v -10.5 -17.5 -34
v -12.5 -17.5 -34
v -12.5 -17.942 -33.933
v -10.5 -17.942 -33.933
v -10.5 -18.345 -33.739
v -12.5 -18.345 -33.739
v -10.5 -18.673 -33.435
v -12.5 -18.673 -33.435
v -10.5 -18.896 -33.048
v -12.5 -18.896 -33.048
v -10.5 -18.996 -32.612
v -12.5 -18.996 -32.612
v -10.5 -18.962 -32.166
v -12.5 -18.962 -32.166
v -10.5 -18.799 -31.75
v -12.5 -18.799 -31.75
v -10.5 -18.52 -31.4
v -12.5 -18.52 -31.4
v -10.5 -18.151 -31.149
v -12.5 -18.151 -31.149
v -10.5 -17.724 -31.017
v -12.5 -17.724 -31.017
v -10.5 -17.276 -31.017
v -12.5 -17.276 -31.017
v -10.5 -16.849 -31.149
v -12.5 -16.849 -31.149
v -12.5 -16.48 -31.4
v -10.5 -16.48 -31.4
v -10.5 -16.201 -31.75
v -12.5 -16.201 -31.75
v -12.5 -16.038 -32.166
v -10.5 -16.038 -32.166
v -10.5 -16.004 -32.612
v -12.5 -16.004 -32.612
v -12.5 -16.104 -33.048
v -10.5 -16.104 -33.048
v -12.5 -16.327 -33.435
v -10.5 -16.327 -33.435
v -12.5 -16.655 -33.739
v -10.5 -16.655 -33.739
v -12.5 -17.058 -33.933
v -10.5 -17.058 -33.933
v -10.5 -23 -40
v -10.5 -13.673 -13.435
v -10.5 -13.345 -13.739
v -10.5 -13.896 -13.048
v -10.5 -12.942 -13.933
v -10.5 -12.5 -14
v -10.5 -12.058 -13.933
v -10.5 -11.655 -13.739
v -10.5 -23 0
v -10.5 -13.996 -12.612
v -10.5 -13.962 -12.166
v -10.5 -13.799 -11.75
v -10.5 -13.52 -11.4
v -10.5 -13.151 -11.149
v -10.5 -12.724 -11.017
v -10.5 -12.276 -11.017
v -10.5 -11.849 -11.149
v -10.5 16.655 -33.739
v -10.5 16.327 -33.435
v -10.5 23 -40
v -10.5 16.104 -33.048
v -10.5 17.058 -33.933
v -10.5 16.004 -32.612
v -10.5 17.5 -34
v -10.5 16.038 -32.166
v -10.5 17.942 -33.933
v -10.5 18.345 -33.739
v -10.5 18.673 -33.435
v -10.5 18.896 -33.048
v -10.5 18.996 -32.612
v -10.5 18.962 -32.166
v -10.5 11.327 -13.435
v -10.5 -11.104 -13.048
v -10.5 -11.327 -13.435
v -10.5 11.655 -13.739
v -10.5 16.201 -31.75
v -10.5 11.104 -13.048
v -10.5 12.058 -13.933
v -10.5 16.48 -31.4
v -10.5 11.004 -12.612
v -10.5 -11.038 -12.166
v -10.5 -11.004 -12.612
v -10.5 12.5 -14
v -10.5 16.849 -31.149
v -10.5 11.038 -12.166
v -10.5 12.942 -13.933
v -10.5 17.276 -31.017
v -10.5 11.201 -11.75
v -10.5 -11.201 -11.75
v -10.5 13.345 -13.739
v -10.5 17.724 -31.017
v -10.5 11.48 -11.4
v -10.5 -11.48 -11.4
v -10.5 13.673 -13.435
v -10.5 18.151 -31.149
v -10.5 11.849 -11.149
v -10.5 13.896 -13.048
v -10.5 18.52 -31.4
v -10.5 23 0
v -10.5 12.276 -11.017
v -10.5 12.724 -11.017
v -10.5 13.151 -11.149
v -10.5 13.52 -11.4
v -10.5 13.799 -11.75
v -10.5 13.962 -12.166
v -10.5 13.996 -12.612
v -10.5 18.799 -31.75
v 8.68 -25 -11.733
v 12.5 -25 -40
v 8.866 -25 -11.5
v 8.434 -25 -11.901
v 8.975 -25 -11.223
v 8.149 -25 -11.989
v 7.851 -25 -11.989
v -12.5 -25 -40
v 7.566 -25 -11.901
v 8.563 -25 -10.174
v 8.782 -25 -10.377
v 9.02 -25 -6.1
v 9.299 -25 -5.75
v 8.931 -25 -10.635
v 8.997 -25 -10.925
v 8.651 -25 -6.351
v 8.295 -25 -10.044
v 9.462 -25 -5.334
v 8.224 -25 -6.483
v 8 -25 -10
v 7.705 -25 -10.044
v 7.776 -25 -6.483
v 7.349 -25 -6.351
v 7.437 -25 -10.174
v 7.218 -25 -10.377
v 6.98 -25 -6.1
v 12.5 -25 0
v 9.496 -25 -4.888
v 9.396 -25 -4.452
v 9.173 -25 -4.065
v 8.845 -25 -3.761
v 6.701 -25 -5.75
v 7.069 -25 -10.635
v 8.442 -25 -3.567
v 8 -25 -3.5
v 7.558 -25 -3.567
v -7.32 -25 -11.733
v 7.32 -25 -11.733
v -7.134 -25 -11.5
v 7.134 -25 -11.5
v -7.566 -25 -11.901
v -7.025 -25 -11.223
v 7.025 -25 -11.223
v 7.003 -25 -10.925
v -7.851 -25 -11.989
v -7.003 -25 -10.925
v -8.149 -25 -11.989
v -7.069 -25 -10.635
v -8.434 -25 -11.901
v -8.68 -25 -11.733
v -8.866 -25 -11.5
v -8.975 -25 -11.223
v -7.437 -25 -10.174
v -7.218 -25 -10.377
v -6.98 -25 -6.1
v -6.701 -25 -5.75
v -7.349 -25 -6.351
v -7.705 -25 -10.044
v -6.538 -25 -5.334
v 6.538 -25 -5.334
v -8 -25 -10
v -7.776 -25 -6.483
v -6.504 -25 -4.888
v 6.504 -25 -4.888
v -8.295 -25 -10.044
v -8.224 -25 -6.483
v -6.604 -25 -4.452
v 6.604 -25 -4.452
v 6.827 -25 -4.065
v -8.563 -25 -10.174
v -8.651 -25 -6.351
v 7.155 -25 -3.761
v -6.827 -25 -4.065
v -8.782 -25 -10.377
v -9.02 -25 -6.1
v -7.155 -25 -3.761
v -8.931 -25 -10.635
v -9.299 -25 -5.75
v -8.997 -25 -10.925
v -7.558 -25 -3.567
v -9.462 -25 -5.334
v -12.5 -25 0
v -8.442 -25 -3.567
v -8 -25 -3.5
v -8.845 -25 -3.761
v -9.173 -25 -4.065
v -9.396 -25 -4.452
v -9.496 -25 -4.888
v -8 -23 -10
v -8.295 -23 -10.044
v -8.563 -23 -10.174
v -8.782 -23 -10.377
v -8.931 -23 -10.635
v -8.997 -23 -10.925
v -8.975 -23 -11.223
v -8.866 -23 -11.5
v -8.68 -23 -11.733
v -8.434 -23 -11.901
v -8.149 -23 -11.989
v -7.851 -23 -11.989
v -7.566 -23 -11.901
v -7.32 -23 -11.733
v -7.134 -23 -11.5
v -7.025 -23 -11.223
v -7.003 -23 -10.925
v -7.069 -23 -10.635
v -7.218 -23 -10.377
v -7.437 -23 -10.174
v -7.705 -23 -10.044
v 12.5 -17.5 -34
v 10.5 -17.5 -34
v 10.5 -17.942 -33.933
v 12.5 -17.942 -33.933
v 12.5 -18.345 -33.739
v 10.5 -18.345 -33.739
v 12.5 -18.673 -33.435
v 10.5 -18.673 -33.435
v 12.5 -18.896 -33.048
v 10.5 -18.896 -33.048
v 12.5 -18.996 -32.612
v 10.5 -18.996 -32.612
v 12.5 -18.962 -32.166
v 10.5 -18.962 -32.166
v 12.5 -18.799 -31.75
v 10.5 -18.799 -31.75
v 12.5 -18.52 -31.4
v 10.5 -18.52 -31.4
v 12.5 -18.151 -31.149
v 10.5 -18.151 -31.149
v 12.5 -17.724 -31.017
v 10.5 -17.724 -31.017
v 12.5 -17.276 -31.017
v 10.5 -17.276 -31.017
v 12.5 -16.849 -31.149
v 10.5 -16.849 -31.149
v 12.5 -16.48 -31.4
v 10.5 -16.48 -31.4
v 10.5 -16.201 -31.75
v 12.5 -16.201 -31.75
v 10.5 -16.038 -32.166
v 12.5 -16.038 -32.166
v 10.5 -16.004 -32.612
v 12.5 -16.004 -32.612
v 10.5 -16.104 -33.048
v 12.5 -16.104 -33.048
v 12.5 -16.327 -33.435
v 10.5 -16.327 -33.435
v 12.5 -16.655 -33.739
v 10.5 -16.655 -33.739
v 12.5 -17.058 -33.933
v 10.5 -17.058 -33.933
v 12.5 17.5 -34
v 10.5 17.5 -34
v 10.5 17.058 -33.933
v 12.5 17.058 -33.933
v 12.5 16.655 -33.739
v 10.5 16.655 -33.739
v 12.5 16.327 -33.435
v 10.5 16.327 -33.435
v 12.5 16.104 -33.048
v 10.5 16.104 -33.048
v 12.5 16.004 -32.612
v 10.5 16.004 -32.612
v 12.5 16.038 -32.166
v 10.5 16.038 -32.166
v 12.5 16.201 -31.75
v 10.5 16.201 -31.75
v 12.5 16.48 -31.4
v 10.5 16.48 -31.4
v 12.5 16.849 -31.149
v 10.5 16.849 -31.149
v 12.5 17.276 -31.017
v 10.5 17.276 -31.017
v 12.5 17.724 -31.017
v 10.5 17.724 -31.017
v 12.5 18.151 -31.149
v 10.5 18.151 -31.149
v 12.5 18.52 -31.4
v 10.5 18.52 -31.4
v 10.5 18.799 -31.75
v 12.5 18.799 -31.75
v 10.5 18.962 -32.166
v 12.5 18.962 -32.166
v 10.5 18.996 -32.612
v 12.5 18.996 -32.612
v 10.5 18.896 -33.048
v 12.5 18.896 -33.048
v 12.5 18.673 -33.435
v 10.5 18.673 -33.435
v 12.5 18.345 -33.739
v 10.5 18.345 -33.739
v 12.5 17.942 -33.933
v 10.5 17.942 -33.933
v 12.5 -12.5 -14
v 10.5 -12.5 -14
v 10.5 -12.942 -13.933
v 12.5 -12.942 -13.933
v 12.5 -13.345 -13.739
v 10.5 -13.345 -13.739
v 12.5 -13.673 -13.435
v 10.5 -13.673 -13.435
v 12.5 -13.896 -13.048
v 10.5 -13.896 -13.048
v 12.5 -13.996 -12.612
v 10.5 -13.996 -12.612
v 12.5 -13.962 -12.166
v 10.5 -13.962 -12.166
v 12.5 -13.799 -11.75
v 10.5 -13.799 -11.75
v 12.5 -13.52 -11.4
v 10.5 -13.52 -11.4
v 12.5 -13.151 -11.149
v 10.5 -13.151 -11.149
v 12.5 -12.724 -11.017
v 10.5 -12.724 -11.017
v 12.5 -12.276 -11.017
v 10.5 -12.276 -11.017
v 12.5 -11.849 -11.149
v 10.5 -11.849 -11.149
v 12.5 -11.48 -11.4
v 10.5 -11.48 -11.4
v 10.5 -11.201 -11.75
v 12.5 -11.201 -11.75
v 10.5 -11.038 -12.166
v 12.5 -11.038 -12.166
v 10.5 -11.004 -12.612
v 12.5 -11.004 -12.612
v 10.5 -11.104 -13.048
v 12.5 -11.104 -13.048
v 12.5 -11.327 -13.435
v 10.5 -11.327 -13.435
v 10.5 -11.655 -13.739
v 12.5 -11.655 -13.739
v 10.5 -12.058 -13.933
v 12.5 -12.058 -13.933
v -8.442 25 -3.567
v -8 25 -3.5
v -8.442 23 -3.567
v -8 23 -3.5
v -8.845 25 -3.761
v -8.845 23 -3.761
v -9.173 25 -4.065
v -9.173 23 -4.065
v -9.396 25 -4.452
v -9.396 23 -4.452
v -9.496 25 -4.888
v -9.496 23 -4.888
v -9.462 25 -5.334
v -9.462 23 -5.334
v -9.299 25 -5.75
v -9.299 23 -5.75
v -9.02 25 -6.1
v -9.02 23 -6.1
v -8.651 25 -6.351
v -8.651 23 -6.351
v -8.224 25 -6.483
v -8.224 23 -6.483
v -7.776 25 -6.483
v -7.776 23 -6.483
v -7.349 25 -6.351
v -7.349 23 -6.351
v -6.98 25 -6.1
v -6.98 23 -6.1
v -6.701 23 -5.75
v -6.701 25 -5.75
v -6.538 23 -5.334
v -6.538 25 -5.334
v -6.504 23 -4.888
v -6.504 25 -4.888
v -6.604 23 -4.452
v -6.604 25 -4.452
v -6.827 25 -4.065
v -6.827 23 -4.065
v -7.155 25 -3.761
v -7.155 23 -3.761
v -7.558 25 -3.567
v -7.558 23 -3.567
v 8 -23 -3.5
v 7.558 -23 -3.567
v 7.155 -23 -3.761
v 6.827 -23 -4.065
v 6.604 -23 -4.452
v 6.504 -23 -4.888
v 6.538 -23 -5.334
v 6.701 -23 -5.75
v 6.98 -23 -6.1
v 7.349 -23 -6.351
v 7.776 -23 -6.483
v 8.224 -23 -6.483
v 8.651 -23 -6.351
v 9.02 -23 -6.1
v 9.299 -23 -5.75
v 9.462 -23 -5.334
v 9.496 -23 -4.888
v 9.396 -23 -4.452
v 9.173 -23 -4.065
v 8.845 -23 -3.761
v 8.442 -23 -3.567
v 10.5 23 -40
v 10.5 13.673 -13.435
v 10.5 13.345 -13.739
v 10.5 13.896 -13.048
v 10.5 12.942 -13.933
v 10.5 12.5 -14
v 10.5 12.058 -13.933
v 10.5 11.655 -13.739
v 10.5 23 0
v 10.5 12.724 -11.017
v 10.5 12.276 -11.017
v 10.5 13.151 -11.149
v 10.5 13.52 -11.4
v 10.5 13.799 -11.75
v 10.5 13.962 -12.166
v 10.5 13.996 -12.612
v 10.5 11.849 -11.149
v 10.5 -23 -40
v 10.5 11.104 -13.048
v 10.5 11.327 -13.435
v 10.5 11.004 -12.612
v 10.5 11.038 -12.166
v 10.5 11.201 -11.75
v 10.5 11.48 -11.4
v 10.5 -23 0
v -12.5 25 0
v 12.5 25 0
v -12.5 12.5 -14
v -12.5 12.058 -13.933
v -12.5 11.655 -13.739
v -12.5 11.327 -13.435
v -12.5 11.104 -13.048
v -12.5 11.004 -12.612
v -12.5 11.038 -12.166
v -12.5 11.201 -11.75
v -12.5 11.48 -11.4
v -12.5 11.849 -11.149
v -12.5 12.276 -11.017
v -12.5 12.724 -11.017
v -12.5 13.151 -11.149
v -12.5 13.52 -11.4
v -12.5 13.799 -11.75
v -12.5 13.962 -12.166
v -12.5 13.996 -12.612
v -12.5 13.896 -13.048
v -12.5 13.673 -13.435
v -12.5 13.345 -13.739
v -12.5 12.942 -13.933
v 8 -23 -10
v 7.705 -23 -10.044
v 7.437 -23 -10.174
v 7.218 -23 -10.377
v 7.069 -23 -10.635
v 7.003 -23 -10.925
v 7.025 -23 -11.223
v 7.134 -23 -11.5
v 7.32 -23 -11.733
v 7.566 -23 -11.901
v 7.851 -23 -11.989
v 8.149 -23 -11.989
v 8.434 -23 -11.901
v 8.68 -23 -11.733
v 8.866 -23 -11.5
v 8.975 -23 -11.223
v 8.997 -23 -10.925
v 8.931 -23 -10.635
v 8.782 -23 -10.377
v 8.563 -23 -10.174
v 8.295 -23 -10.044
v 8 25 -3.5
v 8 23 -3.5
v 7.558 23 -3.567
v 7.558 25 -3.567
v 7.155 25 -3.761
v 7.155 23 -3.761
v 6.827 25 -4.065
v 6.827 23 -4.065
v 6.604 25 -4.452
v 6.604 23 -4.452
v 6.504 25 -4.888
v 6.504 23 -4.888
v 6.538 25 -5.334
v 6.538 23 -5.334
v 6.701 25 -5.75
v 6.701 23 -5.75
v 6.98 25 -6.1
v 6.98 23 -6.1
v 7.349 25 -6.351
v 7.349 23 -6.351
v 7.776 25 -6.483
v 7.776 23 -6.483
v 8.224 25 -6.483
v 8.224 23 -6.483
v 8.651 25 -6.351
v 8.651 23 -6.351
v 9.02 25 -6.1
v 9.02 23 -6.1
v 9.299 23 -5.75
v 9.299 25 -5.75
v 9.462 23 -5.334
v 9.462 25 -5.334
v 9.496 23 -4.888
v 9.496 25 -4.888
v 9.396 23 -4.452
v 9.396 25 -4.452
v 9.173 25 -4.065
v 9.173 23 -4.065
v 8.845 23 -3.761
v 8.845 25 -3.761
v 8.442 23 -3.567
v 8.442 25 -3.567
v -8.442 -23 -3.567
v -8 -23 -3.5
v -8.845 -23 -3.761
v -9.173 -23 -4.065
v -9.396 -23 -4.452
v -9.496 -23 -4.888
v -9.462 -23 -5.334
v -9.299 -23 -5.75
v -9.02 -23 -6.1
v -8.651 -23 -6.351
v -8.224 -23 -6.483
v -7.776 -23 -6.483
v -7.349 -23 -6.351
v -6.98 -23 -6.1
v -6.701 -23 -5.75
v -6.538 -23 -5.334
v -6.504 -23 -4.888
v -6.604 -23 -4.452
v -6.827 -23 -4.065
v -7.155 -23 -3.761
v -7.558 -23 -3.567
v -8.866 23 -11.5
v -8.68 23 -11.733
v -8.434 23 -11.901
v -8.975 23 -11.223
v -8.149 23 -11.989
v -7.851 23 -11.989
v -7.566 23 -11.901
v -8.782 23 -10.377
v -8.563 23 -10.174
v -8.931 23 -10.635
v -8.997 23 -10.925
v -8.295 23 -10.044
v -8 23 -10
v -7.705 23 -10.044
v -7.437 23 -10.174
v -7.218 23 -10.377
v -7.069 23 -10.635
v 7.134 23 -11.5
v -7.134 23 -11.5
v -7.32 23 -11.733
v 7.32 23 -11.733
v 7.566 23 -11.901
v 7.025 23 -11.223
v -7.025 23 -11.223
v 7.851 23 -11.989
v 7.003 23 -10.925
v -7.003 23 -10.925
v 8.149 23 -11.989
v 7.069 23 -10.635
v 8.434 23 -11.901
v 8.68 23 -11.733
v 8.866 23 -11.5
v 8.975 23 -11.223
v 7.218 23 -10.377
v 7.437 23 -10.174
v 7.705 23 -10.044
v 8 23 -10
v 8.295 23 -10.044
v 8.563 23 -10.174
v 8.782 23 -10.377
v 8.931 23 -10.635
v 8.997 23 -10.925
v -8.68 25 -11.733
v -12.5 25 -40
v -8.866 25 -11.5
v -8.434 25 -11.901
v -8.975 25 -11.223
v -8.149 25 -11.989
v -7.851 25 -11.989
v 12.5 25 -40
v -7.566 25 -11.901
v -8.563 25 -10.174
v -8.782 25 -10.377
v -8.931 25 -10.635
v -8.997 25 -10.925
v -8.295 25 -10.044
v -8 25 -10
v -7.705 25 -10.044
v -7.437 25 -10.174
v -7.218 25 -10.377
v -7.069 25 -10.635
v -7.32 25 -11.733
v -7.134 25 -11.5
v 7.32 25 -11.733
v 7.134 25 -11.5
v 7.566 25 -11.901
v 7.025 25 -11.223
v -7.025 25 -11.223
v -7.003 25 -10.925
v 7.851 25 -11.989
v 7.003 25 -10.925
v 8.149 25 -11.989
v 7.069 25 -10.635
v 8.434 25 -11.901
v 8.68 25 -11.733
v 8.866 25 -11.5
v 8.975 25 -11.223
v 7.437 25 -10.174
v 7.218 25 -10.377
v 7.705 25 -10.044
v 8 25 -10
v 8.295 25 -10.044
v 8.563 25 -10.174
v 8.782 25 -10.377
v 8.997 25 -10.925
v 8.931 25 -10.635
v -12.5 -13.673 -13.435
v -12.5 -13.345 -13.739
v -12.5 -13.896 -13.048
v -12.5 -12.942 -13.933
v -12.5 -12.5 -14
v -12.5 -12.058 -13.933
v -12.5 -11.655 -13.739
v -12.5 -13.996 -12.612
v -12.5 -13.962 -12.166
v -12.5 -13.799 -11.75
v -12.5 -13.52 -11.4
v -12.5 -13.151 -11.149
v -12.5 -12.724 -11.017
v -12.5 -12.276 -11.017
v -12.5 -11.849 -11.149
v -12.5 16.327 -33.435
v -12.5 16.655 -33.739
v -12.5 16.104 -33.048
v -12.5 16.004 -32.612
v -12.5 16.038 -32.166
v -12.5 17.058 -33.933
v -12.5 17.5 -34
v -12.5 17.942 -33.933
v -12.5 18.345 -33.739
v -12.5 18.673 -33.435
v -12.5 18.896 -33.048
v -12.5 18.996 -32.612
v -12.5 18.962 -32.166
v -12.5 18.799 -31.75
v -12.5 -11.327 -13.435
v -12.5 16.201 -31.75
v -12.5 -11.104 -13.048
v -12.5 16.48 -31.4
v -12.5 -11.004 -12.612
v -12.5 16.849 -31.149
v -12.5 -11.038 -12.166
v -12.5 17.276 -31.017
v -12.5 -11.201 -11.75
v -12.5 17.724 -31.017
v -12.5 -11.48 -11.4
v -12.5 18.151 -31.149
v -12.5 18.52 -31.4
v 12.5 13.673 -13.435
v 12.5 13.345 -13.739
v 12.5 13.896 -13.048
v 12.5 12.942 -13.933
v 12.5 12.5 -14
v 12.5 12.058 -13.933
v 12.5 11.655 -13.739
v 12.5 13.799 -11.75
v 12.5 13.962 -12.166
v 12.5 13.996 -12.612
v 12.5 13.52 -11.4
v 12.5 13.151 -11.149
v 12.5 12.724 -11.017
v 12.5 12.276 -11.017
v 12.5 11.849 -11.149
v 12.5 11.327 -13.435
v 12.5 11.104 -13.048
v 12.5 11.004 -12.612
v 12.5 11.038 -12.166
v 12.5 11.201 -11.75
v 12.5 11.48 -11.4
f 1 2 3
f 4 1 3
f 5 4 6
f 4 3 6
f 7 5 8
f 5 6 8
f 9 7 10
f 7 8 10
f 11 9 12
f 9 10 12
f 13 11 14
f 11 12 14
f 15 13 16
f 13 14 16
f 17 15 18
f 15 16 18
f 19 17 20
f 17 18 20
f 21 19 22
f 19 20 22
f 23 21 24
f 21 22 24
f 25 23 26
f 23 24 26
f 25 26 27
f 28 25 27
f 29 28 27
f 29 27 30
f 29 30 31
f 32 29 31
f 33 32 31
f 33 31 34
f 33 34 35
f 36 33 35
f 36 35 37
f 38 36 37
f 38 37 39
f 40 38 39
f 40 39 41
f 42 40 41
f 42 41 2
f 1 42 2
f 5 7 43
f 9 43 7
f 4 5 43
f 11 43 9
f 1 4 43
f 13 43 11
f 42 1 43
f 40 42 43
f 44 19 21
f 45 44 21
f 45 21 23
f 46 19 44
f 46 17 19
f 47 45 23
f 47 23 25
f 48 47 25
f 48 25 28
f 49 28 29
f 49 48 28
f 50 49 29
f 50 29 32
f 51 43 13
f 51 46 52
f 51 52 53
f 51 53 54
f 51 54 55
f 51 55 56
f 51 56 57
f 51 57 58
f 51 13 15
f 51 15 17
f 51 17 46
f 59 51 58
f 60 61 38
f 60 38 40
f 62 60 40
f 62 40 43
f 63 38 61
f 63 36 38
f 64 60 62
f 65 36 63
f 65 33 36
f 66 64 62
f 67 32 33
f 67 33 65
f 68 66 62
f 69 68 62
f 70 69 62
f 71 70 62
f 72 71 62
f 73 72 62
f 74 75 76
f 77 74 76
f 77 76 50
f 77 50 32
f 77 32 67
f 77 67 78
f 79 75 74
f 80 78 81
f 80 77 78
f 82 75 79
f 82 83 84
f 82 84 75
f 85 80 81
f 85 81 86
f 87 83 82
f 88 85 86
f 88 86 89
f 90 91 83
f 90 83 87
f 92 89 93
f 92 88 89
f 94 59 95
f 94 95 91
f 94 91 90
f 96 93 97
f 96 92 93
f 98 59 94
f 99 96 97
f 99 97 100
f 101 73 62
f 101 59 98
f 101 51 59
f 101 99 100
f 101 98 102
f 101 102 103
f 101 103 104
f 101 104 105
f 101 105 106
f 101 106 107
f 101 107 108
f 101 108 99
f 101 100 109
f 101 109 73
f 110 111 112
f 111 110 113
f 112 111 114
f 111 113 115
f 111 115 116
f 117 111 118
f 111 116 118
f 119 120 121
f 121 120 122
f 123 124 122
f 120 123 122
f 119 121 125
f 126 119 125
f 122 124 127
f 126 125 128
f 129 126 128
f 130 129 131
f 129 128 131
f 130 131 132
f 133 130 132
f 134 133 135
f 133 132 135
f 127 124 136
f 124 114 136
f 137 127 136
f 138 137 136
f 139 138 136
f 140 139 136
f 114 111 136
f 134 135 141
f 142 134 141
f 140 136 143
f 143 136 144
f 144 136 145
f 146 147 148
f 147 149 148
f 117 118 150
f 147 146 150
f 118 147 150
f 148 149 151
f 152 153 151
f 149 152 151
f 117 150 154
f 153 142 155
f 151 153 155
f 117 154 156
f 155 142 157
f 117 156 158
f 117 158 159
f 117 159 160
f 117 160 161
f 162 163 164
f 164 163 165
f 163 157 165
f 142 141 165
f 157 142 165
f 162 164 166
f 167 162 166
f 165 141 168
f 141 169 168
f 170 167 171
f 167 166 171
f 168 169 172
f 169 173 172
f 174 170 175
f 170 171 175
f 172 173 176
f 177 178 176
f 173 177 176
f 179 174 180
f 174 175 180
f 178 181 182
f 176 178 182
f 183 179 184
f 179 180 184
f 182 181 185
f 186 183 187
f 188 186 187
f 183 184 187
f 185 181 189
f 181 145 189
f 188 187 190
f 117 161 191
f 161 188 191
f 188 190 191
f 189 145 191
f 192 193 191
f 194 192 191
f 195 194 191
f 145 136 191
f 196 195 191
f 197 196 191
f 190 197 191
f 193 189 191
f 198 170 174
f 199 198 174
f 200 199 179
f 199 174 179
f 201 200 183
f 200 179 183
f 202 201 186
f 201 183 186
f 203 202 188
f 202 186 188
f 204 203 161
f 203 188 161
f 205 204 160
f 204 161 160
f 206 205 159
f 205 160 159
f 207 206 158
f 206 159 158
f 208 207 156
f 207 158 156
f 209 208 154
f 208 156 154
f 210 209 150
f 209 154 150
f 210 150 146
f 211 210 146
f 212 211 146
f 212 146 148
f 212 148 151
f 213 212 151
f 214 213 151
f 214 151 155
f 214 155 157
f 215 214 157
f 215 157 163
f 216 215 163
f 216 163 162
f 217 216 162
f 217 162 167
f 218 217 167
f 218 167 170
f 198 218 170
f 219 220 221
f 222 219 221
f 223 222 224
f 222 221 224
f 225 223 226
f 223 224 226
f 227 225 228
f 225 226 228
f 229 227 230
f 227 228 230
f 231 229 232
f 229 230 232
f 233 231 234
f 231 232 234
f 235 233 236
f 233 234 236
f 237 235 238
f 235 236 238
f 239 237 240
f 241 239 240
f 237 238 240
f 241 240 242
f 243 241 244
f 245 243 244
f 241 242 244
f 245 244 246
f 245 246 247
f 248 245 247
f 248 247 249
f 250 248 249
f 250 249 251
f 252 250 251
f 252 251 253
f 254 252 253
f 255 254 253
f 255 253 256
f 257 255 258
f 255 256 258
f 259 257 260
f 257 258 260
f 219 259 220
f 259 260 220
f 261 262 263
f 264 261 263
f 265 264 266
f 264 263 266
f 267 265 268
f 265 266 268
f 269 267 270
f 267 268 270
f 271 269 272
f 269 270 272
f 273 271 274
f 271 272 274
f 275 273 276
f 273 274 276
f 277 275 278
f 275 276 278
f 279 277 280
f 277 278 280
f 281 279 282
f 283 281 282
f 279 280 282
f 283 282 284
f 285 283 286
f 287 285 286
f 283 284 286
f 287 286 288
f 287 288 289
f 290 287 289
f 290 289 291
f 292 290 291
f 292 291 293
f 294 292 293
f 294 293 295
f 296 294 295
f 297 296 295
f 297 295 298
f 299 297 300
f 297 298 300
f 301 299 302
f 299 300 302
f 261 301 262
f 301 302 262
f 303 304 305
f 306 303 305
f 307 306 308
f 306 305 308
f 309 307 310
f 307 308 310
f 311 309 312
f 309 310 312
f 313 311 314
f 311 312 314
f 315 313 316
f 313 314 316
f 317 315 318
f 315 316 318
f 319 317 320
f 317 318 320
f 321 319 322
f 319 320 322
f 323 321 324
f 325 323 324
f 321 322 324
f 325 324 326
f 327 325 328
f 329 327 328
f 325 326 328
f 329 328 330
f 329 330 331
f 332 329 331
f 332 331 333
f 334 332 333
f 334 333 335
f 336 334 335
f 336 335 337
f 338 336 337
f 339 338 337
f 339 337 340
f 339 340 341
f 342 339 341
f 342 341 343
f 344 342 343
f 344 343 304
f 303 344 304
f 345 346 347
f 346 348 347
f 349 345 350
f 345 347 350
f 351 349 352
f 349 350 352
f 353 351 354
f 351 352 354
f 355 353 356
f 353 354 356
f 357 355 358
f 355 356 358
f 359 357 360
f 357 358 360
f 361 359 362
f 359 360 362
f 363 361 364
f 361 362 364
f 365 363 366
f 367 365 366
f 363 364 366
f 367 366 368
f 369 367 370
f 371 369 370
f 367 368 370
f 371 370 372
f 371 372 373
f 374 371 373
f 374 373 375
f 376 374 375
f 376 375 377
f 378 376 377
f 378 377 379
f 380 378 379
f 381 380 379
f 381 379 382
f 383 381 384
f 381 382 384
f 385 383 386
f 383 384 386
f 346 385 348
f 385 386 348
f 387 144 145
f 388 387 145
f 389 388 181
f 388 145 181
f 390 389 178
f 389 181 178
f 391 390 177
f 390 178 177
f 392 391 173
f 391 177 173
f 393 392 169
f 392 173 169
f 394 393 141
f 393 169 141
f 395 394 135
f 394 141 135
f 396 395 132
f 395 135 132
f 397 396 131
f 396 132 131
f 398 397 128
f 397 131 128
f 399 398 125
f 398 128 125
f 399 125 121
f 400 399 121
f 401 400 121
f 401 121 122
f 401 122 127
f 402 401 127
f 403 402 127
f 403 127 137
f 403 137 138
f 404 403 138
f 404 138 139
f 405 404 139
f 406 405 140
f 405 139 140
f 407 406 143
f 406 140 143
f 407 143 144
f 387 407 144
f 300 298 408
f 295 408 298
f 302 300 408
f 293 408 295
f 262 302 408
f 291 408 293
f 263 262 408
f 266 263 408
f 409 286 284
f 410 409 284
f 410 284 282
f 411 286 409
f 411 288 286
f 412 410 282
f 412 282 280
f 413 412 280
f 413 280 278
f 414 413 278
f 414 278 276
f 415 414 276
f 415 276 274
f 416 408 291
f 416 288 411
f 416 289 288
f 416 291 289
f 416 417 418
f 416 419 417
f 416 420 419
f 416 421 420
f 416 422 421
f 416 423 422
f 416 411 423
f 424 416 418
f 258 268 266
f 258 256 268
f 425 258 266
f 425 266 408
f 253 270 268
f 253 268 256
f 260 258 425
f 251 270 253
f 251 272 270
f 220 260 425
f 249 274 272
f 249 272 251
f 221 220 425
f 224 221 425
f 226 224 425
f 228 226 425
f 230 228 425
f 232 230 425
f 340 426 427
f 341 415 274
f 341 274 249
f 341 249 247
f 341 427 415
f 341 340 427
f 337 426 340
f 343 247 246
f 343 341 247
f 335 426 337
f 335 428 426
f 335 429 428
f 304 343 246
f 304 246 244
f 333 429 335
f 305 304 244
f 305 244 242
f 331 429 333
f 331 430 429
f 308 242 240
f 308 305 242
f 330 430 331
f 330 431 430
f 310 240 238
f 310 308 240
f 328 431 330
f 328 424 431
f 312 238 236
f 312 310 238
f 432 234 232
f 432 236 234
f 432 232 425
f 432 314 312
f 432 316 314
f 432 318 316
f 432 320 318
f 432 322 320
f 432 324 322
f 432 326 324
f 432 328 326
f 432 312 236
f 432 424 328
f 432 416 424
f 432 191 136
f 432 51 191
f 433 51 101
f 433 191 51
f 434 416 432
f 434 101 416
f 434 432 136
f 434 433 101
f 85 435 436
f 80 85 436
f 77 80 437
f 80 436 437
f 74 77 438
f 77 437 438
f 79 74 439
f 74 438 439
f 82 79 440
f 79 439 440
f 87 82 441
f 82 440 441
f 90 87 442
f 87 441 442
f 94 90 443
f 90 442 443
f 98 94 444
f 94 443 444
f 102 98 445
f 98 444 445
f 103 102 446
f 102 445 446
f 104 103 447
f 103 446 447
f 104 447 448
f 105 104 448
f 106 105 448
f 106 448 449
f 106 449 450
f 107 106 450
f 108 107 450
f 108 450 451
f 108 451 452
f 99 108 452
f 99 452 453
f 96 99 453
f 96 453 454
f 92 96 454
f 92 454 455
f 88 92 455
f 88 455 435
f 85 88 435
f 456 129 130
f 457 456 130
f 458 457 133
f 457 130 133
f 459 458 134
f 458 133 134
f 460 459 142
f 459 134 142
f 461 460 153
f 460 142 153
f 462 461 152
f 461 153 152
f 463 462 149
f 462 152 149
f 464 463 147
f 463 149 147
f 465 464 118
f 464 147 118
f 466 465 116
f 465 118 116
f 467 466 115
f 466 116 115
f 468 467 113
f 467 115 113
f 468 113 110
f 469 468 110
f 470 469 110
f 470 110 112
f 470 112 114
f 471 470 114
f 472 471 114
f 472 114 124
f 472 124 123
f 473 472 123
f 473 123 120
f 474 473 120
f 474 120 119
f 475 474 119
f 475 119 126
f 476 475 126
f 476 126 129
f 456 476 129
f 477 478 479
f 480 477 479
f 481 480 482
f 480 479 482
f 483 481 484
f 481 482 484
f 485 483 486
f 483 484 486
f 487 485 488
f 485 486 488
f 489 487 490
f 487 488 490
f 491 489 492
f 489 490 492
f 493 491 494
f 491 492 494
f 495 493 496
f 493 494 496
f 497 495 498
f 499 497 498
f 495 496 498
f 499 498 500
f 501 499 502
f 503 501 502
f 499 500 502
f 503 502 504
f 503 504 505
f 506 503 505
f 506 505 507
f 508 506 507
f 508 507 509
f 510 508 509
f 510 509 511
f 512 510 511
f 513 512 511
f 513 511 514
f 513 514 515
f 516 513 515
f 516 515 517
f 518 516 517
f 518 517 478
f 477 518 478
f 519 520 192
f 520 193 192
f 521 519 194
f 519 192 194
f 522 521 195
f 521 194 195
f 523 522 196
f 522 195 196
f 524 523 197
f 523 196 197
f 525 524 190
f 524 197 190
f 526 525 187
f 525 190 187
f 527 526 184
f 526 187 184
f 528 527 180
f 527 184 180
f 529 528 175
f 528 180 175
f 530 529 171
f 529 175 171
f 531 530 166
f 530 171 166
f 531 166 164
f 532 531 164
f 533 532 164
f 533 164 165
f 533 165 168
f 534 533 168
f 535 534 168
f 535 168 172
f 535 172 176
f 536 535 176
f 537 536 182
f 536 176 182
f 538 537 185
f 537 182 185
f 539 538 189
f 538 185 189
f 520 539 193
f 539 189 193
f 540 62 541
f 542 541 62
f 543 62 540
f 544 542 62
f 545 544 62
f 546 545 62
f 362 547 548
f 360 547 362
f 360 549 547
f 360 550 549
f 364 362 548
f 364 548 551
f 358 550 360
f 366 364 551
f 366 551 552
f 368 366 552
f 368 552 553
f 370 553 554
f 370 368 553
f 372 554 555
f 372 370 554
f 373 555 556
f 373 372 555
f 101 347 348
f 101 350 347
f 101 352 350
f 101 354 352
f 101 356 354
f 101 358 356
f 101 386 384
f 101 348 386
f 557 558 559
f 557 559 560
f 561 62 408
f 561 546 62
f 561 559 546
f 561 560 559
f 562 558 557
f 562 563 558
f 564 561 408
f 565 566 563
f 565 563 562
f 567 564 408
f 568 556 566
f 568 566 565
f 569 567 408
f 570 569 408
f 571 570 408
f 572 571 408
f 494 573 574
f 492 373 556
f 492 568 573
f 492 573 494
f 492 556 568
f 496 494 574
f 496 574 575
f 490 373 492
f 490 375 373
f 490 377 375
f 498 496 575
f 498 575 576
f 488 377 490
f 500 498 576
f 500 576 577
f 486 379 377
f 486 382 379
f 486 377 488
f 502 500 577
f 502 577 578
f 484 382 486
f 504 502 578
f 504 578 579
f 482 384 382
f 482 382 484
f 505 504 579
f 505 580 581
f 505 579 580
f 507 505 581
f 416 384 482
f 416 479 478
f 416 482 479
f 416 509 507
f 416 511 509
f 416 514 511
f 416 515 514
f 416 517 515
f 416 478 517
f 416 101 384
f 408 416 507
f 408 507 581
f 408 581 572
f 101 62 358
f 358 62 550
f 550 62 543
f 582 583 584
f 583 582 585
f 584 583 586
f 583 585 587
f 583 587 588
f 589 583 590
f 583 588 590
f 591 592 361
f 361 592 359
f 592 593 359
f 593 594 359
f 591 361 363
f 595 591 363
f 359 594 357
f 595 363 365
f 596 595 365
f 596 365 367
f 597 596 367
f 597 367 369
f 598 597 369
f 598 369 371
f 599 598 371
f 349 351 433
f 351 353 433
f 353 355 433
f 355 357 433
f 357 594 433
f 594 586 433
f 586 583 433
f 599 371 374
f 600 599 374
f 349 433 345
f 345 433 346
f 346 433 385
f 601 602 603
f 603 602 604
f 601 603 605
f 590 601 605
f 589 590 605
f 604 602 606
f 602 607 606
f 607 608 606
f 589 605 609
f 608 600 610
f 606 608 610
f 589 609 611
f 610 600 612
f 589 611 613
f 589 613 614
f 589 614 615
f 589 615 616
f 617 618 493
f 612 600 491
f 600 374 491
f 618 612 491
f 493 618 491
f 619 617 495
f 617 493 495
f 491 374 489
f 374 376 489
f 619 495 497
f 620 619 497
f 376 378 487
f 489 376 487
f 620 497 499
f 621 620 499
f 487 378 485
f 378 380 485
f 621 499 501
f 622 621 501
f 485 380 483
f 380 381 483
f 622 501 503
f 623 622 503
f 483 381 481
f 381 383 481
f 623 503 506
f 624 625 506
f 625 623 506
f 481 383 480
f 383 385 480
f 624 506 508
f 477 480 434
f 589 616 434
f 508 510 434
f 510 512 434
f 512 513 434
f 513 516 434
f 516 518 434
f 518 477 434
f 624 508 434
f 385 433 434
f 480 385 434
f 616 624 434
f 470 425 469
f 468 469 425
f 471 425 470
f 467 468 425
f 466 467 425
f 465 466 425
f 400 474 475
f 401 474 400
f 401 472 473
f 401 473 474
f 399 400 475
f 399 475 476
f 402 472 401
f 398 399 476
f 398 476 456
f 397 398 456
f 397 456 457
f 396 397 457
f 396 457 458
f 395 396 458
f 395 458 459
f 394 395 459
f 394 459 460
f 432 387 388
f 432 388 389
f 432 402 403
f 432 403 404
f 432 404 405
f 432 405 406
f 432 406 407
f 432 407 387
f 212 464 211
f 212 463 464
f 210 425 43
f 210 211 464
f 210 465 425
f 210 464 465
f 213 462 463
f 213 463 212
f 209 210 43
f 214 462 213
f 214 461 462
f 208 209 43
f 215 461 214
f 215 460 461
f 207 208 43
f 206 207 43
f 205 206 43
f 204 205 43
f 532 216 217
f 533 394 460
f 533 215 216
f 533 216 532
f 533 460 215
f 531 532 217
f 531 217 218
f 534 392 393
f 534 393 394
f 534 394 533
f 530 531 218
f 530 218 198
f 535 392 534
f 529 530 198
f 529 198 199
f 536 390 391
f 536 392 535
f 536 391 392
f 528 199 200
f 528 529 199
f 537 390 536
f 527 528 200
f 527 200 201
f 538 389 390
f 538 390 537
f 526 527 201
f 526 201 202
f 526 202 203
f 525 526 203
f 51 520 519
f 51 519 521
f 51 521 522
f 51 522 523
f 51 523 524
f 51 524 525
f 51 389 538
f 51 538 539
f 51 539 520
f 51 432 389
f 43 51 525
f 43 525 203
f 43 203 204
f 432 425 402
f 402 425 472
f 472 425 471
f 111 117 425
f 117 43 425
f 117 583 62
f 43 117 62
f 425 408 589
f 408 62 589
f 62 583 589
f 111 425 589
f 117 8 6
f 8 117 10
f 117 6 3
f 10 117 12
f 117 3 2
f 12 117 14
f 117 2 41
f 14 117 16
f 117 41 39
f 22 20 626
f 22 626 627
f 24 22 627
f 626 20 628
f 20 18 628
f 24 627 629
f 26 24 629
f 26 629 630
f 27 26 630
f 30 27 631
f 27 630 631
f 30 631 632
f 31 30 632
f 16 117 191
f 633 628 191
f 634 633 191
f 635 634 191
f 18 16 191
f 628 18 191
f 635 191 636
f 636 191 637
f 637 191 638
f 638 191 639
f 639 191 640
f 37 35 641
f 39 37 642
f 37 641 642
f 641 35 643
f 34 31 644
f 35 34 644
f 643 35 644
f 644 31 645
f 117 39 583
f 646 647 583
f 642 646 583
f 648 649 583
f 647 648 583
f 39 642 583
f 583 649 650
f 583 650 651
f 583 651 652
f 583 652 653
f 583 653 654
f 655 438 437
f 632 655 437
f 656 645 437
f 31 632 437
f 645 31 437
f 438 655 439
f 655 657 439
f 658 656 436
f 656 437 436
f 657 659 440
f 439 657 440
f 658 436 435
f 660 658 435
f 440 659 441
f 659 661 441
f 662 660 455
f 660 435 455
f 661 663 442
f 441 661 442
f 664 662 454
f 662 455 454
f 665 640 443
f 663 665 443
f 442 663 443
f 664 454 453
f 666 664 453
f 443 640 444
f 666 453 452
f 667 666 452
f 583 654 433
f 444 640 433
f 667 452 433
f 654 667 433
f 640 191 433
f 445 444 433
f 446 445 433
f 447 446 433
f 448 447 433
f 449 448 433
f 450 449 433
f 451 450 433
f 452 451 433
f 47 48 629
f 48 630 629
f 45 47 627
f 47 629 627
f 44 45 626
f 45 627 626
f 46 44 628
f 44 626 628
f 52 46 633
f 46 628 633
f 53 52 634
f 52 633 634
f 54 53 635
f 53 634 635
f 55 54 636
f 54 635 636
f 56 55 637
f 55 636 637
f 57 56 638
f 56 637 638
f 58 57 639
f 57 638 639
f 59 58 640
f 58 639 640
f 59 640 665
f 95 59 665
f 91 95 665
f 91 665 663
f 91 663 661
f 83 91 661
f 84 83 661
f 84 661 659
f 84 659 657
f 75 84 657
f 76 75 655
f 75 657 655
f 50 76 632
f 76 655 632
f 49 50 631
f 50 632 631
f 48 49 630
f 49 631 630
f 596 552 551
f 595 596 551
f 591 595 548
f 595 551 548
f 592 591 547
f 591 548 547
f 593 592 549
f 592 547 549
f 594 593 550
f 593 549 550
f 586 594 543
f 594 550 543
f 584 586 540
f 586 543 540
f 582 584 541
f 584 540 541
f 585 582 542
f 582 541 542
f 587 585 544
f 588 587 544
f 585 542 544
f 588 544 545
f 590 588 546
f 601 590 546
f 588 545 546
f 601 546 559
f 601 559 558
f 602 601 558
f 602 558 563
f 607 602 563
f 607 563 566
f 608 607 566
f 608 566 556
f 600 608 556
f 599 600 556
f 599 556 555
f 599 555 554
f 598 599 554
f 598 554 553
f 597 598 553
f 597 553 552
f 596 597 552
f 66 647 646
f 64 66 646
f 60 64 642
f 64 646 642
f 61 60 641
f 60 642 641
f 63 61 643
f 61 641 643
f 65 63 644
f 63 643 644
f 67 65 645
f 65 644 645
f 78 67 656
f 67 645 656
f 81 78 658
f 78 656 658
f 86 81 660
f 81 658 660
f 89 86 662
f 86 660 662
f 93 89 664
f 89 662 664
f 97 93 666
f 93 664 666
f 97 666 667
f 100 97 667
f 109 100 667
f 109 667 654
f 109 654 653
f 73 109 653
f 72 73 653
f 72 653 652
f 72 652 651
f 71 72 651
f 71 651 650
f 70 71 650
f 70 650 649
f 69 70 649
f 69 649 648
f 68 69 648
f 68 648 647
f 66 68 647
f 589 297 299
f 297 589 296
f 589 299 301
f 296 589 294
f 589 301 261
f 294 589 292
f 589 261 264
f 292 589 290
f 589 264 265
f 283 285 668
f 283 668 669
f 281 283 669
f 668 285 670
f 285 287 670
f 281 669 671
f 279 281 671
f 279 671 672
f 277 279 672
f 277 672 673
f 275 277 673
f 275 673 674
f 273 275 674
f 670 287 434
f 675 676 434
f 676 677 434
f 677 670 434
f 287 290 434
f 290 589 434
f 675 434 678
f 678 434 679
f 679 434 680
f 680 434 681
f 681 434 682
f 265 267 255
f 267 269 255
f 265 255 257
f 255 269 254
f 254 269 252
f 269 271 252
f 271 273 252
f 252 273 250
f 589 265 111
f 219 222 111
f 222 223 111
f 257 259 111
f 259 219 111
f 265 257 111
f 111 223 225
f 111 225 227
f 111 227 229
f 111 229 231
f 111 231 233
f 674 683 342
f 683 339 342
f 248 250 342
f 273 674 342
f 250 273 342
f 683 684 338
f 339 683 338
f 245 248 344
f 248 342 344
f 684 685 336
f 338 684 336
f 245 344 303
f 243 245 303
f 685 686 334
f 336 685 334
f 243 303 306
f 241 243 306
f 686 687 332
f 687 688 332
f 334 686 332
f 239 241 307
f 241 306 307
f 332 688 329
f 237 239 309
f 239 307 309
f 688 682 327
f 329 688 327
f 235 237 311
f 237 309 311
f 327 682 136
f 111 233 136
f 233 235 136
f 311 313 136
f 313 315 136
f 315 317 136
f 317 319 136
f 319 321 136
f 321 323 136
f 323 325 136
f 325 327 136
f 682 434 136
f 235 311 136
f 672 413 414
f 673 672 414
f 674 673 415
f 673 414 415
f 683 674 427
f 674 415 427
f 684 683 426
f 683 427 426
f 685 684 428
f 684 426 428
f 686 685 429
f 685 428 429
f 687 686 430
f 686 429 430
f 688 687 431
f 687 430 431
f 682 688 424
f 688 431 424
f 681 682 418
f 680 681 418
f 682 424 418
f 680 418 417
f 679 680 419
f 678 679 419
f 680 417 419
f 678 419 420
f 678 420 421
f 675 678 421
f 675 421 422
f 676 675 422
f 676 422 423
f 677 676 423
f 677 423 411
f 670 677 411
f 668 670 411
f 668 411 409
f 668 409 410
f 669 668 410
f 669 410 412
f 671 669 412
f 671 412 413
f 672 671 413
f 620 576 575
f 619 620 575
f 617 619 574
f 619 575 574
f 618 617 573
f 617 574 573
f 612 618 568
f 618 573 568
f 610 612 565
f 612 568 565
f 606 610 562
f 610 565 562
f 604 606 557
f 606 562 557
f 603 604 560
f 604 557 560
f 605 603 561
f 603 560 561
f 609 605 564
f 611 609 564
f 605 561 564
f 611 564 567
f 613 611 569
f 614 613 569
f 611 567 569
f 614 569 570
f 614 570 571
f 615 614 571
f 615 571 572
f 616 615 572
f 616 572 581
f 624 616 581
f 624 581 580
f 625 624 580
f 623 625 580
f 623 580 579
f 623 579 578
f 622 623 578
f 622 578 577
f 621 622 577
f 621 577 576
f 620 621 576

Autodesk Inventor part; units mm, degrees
ref_plane "YZ Plane" through (0, 0, 0) normal (1, 0, 0) x (0, 1, 0)
ref_plane "XZ Plane" through (0, 0, 0) normal (0, 1, 0) x (-1, 0, 0)
ref_plane "XY Plane" through (0, 0, 0) normal (0, 0, 1) x (1, 0, 0)
sketch "スケッチ1" plane through (0, 0, 0) normal (0, 0, 1) x (1, 0, 0)
  line L0 (-12.5, 25) -> (12.5, 25)
  line L1 (12.5, 25) -> (12.5, -25)
  line L2 (12.5, -25) -> (-12.5, -25)
  line L3 (-12.5, -25) -> (-12.5, 25)
  line L4 (-10.5, 23) -> (10.5, 23)
  line L5 (10.5, 23) -> (10.5, -23)
  line L6 (10.5, -23) -> (-10.5, -23)
  line L7 (-10.5, -23) -> (-10.5, 23)
  point P0 (0, 0)
  dimension "d0" = 21
  dimension "d2" = 25
  dimension "d3" = 10.5
  dimension "d4" = 46
  dimension "d5" = 50
  dimension "d6" = 23
  dimension "d7" = 25
  dimension "d8" = 12.5
extrude "押し出し1" add sketch "スケッチ1" against normal blind 40
sketch "スケッチ2" plane through (-12.5, 25, 0) normal (0, 1, 0) x (1, 0, 0)
  line L0 (0, 0) -> (25, 0) projected
  line L1 (0, 0) -> (0, 40) projected
  circle A0 centre (4.5, 5) radius 1.5
  circle A1 centre (20.5, 5) radius 1.5
  point P0 (12.5, 0)
  dimension "d13" = 3
  dimension "d14" = 16
  dimension "d16" = 4.5
  dimension "d18" = 5
  dimension "d21" = 5
hole "穴1" at (8, 25, -5) at (-8, 25, -5) direction (0, -1, 0) diameter 3 end through all
sketch "スケッチ3" plane through (-12.5, 25, 0) normal (0, 1, 0) x (1, 0, 0)
  circle A0 centre (20.5, 5) radius 1.5 projected
  circle A1 centre (4.5, 5) radius 1.5 projected
  line L0 (0, 0) -> (0, 40) projected
  circle A2 centre (4.5, 11) radius 1
  circle A3 centre (20.5, 11) radius 1
  point P0 (12.5, 0)
  dimension "d29" = 2
  dimension "d31" = 16
  dimension "d32" = 4.5
  dimension "d33" = 6
  dimension "d34" = 6
hole "穴2" at (8, 25, -11) at (-8, 25, -11) direction (0, -1, 0) diameter 2 end through all
sketch "スケッチ4" plane through (12.5, -25, 0) normal (1, 0, 0) x (0, 0, -1)
  line L0 (0, 0) -> (40, 0) projected
  line L1 (40, 50) -> (40, 0) projected
  circle A0 centre (32.5, 42.5) radius 1.5
  circle A1 centre (32.5, 7.5) radius 1.5
  circle A2 centre (12.5, 12.5) radius 1.5
  circle A3 centre (12.5, 37.5) radius 1.5
  point P0 (0, 25)
  dimension "d42" = 3
  dimension "d44" = 25
  dimension "d45" = 35
  dimension "d46" = 7.5
  dimension "d47" = 12.5
  dimension "d48" = 20
  dimension "d49" = 20
  dimension "d50" = 7.5
  dimension "d51" = 7.5
hole "穴3" at (12.5, -12.5, -12.5) at (12.5, -17.5, -32.5) at (12.5, 17.5, -32.5) at (12.5, 12.5, -12.5) direction (-1, 0, 0) diameter 3 end through all
properties part number "Pitch_Free_Case"
